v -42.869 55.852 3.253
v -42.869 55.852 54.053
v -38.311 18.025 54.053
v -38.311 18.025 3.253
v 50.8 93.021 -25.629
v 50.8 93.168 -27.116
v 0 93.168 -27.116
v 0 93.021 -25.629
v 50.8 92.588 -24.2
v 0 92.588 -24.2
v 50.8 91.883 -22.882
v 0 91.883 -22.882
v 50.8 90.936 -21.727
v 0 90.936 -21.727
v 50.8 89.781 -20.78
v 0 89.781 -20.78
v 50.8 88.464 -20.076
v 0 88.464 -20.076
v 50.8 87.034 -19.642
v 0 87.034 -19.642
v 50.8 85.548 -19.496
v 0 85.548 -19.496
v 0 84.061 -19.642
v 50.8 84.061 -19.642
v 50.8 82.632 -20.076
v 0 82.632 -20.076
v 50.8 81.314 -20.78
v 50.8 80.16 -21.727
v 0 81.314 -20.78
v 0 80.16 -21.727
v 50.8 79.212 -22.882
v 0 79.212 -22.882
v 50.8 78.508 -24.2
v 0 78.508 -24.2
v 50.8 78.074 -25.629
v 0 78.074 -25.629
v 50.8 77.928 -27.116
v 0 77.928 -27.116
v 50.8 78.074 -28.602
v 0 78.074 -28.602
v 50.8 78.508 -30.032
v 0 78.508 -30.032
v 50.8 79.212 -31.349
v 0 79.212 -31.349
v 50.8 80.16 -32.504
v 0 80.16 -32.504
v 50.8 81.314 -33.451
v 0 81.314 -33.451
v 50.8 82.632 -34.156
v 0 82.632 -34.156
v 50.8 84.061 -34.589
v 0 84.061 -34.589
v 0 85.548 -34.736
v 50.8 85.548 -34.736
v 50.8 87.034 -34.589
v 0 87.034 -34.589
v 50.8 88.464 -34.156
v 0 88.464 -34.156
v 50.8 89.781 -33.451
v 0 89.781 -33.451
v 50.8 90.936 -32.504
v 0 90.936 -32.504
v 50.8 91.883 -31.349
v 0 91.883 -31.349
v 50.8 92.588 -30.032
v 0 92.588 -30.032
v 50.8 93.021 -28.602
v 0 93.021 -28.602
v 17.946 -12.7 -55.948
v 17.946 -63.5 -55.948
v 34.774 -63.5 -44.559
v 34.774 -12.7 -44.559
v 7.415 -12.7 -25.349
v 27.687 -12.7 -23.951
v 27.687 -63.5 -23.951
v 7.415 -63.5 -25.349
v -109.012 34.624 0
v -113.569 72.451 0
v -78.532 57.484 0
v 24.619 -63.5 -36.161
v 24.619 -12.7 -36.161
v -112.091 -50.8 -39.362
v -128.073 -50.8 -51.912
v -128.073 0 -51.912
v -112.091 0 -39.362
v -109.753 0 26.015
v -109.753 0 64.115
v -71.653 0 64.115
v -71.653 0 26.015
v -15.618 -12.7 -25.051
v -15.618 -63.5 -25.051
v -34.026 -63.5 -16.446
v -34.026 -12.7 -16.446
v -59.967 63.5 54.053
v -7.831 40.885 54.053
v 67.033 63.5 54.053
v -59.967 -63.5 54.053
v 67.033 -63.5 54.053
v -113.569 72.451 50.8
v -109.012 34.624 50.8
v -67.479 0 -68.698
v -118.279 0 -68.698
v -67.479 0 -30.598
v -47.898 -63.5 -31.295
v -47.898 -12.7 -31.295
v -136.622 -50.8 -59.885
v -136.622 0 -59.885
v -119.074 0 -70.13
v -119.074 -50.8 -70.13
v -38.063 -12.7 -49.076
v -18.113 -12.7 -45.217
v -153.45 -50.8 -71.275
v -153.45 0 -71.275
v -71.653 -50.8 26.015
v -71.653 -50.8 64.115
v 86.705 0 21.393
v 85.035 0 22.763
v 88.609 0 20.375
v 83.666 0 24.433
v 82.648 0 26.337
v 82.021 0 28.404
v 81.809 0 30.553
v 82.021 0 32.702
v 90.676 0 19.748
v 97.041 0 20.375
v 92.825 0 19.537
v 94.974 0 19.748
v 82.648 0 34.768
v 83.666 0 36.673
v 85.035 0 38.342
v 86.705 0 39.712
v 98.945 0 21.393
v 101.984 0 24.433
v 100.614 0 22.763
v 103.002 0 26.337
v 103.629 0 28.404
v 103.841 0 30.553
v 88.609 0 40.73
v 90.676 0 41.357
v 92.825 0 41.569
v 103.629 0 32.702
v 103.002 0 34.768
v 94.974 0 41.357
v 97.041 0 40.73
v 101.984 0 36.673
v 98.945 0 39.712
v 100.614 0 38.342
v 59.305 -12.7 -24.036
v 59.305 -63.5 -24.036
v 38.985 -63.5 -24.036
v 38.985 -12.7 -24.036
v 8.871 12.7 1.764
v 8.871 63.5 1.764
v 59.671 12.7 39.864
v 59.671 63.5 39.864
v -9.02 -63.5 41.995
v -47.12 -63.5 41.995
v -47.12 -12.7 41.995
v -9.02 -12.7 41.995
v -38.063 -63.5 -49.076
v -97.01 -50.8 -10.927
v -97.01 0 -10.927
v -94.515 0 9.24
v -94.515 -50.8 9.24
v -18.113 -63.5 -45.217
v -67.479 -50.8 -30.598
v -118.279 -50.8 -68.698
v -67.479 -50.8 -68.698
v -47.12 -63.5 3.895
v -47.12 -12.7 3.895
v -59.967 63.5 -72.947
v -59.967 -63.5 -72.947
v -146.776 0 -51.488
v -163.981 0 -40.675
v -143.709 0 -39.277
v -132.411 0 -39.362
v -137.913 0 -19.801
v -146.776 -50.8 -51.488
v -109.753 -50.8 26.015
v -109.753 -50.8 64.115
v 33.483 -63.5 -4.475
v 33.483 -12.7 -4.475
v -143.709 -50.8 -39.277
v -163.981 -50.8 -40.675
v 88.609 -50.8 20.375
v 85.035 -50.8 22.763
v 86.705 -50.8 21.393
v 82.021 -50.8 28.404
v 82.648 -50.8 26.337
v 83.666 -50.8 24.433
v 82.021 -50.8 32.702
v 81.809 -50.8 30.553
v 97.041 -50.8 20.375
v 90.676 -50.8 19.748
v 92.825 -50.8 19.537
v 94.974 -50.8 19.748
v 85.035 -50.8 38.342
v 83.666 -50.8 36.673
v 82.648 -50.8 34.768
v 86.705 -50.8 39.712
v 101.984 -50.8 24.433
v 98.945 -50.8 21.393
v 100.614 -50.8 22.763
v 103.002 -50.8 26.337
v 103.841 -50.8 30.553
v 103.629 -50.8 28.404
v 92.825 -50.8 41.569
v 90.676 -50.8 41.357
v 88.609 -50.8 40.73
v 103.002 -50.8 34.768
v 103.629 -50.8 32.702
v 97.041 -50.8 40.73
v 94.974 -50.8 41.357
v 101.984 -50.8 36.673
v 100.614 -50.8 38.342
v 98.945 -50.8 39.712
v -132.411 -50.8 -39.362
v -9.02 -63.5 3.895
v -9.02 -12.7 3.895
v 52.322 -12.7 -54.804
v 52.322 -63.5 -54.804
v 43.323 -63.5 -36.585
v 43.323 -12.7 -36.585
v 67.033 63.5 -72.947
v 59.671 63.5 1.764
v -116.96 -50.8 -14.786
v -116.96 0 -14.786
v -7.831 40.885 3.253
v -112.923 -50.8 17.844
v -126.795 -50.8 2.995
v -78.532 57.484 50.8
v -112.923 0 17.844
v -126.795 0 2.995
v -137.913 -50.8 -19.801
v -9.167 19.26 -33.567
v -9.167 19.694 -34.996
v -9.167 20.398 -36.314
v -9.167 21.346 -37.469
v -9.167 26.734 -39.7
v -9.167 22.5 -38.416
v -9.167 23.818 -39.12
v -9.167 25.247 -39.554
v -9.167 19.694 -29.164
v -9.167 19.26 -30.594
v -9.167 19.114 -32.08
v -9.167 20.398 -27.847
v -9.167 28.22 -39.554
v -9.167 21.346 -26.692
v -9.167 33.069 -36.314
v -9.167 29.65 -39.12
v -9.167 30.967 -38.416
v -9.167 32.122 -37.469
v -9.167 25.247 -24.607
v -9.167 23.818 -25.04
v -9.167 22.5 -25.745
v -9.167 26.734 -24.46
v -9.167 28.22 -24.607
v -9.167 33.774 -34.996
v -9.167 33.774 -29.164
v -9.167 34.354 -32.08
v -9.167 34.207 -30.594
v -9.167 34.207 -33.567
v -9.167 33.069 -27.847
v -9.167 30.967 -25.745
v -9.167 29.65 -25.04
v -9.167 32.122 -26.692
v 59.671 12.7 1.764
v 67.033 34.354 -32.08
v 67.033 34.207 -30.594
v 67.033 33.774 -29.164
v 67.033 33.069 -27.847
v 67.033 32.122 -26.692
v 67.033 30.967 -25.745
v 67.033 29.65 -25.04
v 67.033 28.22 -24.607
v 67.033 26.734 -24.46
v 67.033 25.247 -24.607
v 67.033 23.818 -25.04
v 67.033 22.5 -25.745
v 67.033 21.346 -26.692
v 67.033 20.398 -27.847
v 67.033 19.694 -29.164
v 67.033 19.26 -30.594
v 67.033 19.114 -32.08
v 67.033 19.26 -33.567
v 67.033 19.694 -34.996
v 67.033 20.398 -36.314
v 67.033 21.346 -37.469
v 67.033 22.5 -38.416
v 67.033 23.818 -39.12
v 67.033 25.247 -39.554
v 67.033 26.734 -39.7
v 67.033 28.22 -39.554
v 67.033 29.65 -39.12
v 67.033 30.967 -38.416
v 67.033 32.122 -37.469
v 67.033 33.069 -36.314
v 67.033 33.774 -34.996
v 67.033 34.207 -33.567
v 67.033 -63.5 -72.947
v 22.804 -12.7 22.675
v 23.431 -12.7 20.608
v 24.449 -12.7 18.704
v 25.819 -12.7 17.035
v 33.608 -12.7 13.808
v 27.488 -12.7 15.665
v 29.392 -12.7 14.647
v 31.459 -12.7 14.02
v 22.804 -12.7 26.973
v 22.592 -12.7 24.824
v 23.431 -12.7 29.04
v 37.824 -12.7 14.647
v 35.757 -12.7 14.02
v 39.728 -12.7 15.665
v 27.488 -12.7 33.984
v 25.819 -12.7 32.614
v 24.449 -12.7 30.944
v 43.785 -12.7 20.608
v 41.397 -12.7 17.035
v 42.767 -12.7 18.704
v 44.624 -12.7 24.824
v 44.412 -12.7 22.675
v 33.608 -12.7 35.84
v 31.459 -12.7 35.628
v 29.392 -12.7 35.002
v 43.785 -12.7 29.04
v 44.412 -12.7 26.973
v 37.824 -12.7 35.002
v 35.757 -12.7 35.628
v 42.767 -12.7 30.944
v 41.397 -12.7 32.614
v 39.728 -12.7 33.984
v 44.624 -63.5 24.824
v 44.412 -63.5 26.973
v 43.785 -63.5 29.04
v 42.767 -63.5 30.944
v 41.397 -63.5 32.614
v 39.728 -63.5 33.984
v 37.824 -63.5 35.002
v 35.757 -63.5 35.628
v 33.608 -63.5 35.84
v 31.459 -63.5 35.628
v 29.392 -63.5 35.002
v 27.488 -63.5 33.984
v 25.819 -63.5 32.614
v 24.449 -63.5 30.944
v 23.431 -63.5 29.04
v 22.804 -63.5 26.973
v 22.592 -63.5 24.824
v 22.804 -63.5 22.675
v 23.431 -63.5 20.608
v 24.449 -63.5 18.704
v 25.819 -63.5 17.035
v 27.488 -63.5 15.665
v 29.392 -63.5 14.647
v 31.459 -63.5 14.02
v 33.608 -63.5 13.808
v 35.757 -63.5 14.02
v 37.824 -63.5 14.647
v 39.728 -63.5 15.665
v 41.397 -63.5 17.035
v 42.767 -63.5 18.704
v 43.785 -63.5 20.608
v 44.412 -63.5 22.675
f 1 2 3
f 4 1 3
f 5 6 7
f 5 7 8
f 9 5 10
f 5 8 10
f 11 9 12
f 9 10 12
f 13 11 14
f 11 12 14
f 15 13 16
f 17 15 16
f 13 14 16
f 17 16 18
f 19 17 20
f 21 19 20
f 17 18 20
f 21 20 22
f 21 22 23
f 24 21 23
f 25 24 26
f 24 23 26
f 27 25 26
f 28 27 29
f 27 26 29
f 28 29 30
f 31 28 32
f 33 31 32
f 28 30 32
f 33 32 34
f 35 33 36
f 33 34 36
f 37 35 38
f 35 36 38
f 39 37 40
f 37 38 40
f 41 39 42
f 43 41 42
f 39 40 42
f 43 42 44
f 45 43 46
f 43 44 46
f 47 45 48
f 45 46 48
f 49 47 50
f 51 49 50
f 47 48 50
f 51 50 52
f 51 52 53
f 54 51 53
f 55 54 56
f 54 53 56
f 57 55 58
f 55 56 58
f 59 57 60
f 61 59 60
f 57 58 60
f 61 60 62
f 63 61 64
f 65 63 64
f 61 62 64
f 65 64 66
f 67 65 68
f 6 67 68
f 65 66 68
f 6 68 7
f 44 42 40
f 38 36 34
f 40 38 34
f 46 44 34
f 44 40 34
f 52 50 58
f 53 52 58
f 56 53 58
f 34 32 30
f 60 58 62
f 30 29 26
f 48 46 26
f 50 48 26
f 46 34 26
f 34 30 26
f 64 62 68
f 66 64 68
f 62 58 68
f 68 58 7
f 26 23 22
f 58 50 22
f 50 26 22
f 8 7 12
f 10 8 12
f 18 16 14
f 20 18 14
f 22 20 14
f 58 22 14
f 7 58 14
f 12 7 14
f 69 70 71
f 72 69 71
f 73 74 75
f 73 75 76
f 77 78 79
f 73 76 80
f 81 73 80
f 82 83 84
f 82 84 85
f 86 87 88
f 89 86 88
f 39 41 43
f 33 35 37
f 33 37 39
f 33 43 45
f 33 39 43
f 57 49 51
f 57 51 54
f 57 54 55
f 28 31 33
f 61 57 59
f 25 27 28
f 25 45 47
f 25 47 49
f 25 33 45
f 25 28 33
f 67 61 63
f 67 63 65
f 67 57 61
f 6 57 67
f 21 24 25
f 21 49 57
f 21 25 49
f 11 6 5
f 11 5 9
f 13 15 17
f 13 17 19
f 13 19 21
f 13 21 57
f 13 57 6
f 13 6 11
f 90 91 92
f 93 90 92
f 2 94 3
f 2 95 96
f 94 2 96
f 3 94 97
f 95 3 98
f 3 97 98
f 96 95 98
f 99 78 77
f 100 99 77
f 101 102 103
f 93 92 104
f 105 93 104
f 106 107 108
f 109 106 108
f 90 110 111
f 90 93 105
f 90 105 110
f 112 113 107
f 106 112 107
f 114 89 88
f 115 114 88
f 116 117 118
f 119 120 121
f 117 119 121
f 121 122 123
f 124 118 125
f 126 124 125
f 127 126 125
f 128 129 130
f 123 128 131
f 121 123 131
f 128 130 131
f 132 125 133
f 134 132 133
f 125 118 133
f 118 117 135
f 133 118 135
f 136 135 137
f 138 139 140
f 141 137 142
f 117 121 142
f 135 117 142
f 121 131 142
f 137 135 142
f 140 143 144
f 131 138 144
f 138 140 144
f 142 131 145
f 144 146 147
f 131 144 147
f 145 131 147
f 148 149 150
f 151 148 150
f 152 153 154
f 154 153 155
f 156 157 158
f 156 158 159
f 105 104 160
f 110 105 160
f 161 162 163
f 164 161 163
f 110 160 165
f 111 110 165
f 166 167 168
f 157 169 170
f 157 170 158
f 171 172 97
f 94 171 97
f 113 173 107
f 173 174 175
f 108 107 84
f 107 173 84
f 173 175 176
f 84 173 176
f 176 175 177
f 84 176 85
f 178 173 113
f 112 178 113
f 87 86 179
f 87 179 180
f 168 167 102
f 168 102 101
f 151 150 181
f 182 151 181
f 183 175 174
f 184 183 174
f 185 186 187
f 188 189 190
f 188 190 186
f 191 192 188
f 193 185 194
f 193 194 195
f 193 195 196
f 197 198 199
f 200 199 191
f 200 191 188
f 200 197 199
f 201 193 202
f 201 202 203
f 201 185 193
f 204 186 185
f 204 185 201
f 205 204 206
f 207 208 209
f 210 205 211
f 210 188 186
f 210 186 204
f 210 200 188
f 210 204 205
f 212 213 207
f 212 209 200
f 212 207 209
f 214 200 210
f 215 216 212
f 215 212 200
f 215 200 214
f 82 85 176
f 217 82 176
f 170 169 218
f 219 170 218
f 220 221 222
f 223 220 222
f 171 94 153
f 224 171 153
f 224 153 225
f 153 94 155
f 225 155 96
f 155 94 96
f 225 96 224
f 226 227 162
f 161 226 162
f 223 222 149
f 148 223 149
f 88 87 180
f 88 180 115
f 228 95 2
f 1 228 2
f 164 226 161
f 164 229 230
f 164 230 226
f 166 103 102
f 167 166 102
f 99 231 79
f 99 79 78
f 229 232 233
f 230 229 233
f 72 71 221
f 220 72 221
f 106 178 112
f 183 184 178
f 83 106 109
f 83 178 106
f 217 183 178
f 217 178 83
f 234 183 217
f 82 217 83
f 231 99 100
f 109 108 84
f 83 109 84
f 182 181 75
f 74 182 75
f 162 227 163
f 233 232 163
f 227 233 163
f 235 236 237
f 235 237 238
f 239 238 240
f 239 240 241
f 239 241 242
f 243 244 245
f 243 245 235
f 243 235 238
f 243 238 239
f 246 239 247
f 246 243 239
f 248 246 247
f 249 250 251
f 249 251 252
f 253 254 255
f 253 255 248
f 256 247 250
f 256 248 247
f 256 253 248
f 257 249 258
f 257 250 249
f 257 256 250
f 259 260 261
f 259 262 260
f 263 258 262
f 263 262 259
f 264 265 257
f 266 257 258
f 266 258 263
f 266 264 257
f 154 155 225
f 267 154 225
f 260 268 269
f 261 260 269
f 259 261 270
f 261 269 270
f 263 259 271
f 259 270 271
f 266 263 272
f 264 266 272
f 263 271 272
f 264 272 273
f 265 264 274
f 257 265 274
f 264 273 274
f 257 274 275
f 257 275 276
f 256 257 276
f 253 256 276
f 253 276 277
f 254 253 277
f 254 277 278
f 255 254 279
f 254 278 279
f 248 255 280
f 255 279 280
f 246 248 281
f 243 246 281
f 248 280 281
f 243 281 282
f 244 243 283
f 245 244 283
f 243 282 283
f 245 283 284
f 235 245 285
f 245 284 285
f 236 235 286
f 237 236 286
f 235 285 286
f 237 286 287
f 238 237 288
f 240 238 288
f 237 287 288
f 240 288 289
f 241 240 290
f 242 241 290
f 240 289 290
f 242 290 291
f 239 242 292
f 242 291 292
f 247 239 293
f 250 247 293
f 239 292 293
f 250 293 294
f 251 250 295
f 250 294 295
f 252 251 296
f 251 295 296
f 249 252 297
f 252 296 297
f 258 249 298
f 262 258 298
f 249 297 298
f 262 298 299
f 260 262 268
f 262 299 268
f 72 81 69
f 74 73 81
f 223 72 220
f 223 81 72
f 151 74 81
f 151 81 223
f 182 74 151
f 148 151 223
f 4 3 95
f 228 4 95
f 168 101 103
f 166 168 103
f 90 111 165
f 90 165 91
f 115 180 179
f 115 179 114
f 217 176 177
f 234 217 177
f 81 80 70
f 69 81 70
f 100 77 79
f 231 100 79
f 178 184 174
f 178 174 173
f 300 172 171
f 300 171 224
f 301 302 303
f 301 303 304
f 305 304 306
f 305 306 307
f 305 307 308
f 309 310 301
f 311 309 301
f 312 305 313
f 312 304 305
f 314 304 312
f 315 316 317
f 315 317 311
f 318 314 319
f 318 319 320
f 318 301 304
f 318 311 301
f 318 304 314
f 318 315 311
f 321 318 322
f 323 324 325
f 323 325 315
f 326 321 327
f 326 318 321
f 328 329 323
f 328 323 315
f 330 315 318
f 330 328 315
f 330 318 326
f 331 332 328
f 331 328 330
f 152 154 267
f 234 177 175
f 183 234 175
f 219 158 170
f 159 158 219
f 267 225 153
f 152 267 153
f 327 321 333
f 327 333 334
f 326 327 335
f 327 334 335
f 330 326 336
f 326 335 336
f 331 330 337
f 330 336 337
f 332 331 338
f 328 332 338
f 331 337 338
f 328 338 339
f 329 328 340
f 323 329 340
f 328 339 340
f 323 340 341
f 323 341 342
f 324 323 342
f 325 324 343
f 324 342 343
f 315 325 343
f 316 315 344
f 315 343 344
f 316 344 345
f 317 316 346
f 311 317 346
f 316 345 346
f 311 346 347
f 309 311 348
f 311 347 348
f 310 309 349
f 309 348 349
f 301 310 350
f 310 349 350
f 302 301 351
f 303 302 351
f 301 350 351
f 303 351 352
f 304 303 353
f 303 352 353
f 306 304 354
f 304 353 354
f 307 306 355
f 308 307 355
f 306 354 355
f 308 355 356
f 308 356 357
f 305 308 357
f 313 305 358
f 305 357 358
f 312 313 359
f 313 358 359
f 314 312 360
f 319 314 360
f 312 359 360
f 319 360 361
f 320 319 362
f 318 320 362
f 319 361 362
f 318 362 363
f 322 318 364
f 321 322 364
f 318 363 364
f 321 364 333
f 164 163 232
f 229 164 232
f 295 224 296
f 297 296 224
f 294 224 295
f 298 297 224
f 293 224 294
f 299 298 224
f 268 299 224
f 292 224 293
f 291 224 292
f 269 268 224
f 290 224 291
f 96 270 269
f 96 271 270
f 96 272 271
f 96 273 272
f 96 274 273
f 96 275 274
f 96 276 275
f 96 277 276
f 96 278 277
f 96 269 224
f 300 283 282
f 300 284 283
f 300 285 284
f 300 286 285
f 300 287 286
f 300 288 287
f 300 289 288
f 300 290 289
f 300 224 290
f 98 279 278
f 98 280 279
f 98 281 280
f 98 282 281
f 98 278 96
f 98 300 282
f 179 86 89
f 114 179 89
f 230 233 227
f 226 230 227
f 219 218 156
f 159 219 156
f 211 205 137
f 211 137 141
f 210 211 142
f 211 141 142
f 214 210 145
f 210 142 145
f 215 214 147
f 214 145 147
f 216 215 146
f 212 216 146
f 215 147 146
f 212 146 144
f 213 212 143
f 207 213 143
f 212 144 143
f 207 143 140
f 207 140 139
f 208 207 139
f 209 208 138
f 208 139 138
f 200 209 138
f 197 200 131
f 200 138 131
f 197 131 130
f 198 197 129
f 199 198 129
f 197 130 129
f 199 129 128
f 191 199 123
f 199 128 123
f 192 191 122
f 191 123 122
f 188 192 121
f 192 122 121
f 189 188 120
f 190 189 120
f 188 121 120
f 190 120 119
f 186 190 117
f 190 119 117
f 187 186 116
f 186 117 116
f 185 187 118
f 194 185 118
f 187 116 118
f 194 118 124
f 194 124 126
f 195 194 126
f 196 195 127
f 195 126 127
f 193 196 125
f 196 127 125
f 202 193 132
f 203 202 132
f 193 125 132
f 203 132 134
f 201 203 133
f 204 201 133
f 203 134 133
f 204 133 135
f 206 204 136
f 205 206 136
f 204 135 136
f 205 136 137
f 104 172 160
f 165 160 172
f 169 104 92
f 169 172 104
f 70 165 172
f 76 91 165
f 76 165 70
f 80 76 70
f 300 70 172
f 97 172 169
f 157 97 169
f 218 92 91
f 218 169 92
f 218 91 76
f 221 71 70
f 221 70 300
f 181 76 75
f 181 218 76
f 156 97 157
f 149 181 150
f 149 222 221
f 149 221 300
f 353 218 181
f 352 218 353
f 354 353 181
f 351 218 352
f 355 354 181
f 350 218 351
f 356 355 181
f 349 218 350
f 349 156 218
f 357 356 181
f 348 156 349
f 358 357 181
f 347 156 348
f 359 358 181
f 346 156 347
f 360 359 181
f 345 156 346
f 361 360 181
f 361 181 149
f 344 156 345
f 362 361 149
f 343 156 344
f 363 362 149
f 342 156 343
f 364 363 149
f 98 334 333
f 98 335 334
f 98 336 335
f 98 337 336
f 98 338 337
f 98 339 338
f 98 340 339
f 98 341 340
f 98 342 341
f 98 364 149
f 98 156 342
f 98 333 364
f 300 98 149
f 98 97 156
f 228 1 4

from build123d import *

# Parameters (mm, degrees)
F0_W      = 127
F0_H      = 127
F1_DEPTH  = 63.5
F2_W      = 38.1
F2_H      = 38.1
F3_DEPTH  = 50.8
F4_R      = 11.015952
F5_DEPTH  = 50.8
F7_DEPTH  = 50.8
F10_DEPTH = 50.8
F11_R     = 7.62
F12_DEPTH = 76.2
F13_DEPTH = 50.8
F15_DEPTH = 50.8
F16_W     = 38.1
F16_H     = 38.1
F17_DEPTH = 50.8
F18_R     = 11.015952
F19_DEPTH = 50.8
F22_R     = 7.62
F23_DEPTH = 50.8
F25_DEPTH = 50.8
F27_DEPTH = 50.8
F28_DEPTH = 50.8
F29_DEPTH = 50.8


with BuildPart() as f1:
    # F0 (on Front) → F1 (new body, symmetric)
    with BuildSketch(Plane.XZ):
        with Locations((3.532663, -9.446689)):
            Rectangle(F0_W, F0_H)
    extrude(amount=F1_DEPTH, both=True)

    # F2 (on face) → F3 (cut)
    with BuildSketch(Plane.XZ.offset(63.5)):
        with Locations((-28.070334, 22.945461)):
            Rectangle(F2_W, F2_H)
    extrude(amount=-F3_DEPTH, mode=Mode.SUBTRACT)

    # F4 (on face) → F5 (cut)
    with BuildSketch(Plane.XZ.offset(63.5)):
        with Locations((33.608019, 24.824105)):
            Circle(F4_R)
    extrude(amount=-F5_DEPTH, mode=Mode.SUBTRACT)

    # F6 (on face) → F7 (cut)
    with BuildSketch(Plane.XZ.offset(63.5)):
        Polygon((-38.062943, -49.076173), (-18.112773, -45.217009), (-15.618115, -25.050723), (-34.0265, -16.446437), (-47.898167, -31.294981), align=None)
    extrude(amount=-F7_DEPTH, mode=Mode.SUBTRACT)

    # F9 (on face) → F10 (cut)
    with BuildSketch(Plane.XY.offset(54.053311)):
        Polygon((-38.311298, 18.025117), (-7.8313, 40.885119), (-42.868641, 55.851571), align=None)
    extrude(amount=-F10_DEPTH, mode=Mode.SUBTRACT)

    # F11 (on face) → F12 (cut)
    with BuildSketch(Plane.YZ.offset(67.032663)):
        with Locations((26.733654, -32.080382)):
            Circle(F11_R)
    extrude(amount=-F12_DEPTH, mode=Mode.SUBTRACT)

    # F8 (on face) → F13 (cut)
    with BuildSketch(Plane.XZ.offset(63.5)):
        Polygon((33.483031, -4.474967), (27.686679, -23.950713), (7.41483, -25.348771), (24.619139, -36.161457), (17.945699, -55.948322), (34.773534, -44.558572), (52.321579, -54.803986), (43.322718, -36.585235), (59.304582, -24.036034), (38.984582, -24.036034), align=None)
    extrude(amount=-F13_DEPTH, mode=Mode.SUBTRACT)

    # F14 (on face) → F15 (cut)
    with BuildSketch(Plane(origin=(0, 63.5, 0), x_dir=(-1, 0, 0), z_dir=(0, 1, 0))):
        Polygon((-8.870894, 1.764057), (-59.670894, 39.864057), (-59.670894, 1.764057), align=None)
    extrude(amount=-F15_DEPTH, mode=Mode.SUBTRACT)


with BuildPart() as f17:
    # F16 (on Front) → F17 (new body)
    with BuildSketch(Plane.XZ):
        with Locations((-90.703465, 45.065299)):
            Rectangle(F16_W, F16_H)
    extrude(amount=F17_DEPTH)


with BuildPart() as f19:
    # F18 (on Front) → F19 (new body)
    with BuildSketch(Plane.XZ):
        with Locations((92.824951, 30.552745)):
            Circle(F18_R)
    extrude(amount=F19_DEPTH)


with BuildPart() as f23:
    # F22 (on Right) → F23 (new body)
    with BuildSketch(Plane.YZ):
        with Locations((85.547686, -27.115561)):
            Circle(F22_R)
    extrude(amount=F23_DEPTH)


with BuildPart() as f25:
    # F24 (on Top) → F25 (new body)
    with BuildSketch(Plane.XY):
        Polygon((-109.011692, 34.624267), (-78.531693, 57.484268), (-113.569035, 72.450721), align=None)
    extrude(amount=F25_DEPTH)


with BuildPart() as f27:
    # F26 (on Front) → F27 (new body)
    with BuildSketch(Plane.XZ):
        Polygon((-67.479494, -68.69821), (-67.479494, -30.59821), (-118.279494, -68.69821), align=None)
    extrude(amount=F27_DEPTH)


with BuildPart() as f28:
    # F21 (on Front) → F28 (new body)
    with BuildSketch(Plane.XZ):
        Polygon((-137.912574, -19.801257), (-143.708927, -39.277004), (-163.980775, -40.675062), (-146.776467, -51.487747), (-153.449907, -71.274612), (-136.622072, -59.884863), (-119.074027, -70.130277), (-128.072888, -51.911525), (-112.091024, -39.362324), (-132.411024, -39.362324), align=None)
    extrude(amount=F28_DEPTH)


with BuildPart() as f29:
    # F20 (on Front) → F29 (new body)
    with BuildSketch(Plane.XZ):
        Polygon((-116.95973, -14.785924), (-97.00956, -10.92676), (-94.514902, 9.239525), (-112.923287, 17.843812), (-126.794954, 2.995267), align=None)
    extrude(amount=F29_DEPTH)


solid = Compound([f1.part, f17.part, f19.part, f23.part, f25.part, f27.part, f28.part, f29.part])
